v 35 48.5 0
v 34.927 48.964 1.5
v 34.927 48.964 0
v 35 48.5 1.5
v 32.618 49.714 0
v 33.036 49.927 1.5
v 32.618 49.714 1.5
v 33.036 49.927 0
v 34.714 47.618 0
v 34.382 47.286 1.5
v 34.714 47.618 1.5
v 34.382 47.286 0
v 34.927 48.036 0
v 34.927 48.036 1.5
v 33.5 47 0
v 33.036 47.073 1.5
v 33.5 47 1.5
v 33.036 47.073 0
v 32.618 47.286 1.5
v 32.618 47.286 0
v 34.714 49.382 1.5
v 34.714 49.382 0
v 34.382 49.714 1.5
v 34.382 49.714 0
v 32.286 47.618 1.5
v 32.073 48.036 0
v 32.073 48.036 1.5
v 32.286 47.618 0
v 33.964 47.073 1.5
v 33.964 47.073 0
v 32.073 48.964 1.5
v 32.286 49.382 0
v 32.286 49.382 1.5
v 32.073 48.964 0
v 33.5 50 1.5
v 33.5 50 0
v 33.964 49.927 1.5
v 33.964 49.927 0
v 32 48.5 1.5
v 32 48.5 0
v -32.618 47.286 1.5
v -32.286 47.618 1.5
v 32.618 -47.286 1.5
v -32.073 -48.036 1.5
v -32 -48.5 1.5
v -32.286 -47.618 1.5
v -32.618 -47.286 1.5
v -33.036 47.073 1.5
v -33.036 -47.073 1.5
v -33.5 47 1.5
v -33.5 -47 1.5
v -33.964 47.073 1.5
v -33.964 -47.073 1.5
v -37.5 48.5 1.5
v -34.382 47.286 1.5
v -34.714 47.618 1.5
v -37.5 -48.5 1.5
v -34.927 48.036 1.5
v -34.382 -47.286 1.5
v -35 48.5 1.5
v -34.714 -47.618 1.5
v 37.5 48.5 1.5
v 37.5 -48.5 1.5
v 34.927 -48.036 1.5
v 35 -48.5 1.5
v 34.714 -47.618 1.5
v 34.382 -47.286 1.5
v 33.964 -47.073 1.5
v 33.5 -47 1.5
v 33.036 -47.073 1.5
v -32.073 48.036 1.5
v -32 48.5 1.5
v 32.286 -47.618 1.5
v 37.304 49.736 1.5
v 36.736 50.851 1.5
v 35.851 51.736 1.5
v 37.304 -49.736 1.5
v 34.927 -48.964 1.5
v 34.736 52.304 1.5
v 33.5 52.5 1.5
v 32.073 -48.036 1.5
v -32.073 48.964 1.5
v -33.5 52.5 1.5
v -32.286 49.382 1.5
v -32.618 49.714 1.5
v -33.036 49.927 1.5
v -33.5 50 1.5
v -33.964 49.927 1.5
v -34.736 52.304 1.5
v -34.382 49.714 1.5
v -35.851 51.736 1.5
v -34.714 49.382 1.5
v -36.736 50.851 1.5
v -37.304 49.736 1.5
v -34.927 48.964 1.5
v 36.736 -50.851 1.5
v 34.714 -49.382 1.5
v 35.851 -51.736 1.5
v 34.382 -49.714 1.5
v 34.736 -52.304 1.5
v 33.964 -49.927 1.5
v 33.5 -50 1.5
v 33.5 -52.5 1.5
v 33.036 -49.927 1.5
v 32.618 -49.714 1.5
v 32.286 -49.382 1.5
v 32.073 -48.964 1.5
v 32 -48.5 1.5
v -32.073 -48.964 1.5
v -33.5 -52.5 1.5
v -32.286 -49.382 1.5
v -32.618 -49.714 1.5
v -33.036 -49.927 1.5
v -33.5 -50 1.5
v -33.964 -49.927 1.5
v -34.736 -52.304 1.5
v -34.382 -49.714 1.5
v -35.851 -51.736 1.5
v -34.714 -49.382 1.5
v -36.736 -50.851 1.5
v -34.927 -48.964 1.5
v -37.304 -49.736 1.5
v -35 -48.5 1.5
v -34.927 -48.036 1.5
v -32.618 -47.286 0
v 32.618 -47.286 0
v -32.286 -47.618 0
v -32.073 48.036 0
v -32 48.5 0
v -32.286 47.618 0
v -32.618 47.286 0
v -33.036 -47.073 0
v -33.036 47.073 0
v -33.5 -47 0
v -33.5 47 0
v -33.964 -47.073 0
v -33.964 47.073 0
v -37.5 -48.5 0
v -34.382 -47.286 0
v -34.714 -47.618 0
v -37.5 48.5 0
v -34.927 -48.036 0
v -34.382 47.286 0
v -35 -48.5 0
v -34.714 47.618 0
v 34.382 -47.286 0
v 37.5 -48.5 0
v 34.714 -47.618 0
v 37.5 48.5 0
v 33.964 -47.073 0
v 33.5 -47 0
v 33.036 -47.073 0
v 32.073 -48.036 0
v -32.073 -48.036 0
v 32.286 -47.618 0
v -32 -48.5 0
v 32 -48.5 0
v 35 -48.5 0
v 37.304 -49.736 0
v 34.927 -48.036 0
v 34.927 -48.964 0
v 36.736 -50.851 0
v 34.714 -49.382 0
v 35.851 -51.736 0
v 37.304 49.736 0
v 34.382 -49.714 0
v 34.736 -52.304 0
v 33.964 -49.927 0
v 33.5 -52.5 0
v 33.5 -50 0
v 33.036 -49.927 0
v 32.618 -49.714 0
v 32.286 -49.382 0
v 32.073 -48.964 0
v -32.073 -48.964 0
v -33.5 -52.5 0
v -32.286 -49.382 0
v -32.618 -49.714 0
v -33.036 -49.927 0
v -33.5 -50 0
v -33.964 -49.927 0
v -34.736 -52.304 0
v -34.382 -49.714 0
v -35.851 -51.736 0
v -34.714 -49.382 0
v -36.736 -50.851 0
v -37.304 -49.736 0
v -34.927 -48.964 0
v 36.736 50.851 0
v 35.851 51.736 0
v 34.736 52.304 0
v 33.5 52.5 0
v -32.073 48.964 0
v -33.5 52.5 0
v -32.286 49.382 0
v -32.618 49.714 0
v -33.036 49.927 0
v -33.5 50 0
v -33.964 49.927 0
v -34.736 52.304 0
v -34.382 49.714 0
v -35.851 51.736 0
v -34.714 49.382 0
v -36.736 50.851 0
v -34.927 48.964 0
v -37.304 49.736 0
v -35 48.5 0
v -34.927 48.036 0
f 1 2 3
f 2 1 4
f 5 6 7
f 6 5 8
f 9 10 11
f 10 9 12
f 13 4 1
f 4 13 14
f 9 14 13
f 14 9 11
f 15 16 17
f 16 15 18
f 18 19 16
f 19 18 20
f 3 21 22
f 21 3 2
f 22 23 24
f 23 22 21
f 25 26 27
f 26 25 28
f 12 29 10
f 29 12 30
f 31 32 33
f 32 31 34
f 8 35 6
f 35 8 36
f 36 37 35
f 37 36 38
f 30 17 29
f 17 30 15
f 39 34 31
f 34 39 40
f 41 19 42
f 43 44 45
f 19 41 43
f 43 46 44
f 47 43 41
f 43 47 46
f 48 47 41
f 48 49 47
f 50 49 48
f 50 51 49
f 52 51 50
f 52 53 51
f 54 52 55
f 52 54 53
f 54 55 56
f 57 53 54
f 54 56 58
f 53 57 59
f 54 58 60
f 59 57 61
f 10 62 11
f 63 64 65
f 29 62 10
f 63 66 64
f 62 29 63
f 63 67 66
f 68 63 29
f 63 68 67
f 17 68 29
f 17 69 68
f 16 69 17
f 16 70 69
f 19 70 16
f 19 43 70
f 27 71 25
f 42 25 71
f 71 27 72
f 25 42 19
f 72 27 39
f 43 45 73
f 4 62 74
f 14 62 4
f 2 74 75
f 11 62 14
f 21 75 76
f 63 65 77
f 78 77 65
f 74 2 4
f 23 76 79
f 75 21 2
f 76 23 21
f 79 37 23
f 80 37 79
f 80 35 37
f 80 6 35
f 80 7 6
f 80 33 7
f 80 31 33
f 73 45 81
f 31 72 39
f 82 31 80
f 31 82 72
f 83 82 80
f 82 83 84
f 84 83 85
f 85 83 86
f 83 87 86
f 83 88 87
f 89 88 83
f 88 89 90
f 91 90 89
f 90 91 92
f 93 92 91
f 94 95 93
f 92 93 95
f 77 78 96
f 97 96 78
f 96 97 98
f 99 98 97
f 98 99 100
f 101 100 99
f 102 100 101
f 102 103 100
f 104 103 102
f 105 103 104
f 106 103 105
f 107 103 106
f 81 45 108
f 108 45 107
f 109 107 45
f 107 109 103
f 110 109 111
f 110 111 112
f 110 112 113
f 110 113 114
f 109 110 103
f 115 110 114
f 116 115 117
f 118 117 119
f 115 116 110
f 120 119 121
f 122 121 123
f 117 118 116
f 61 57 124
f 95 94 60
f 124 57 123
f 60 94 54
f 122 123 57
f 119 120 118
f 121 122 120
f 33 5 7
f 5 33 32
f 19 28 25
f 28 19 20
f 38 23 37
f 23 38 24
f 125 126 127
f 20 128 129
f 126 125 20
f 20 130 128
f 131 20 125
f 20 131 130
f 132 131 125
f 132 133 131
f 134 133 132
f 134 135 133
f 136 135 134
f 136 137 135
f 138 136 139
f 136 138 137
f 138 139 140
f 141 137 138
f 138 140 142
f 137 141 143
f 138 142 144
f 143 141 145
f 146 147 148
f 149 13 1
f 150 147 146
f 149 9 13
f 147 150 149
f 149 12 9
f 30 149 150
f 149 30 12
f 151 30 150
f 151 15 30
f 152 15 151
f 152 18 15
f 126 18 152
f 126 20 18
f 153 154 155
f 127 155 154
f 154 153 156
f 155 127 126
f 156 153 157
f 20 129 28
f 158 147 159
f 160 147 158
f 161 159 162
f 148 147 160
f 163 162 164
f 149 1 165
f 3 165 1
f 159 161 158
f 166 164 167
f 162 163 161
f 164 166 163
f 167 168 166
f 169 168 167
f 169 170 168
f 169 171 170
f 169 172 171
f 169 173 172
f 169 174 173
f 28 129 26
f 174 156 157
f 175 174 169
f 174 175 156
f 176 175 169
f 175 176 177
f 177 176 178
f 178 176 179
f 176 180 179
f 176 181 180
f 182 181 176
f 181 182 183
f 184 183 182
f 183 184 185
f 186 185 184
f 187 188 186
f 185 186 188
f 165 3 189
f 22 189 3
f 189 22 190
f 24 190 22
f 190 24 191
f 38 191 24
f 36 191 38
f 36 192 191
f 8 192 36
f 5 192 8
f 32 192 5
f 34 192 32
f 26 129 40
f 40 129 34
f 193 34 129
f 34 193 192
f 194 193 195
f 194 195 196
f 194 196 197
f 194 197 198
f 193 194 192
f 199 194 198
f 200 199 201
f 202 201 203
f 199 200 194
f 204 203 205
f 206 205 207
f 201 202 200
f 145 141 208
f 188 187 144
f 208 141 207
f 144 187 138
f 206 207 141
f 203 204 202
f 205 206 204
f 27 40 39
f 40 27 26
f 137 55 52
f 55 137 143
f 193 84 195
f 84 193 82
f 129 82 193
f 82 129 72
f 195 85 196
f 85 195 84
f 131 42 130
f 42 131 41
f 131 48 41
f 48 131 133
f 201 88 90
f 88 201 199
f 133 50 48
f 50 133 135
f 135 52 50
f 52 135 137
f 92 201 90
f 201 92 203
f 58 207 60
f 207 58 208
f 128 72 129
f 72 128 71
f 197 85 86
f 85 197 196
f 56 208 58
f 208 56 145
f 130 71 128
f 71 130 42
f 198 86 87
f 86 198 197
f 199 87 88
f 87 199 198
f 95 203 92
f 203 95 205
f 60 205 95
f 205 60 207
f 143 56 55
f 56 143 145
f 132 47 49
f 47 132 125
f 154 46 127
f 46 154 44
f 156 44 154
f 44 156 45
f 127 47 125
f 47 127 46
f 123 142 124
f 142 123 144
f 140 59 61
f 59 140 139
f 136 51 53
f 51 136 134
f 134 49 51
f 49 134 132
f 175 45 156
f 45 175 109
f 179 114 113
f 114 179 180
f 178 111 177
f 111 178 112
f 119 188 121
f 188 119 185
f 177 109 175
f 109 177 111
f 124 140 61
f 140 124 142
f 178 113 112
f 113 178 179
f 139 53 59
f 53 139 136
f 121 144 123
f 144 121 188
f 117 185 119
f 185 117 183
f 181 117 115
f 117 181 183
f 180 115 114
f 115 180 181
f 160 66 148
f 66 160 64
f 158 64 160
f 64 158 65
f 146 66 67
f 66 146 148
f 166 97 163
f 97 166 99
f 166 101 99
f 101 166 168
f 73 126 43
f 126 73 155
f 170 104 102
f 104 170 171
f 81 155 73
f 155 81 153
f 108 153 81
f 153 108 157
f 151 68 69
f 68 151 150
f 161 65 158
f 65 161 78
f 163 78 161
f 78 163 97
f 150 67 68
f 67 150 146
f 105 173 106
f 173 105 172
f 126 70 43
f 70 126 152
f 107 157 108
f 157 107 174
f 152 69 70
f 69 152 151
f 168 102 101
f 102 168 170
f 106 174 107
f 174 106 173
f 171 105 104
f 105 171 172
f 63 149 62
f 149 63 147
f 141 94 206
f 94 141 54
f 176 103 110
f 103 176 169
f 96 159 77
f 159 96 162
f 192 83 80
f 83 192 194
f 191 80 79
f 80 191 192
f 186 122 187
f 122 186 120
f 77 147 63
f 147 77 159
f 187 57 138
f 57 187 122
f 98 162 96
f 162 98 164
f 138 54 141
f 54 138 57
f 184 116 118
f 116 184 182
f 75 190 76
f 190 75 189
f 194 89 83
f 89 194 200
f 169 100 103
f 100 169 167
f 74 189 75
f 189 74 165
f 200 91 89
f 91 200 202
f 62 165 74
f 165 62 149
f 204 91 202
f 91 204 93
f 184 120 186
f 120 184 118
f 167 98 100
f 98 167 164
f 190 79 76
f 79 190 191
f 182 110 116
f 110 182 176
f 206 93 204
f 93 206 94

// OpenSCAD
// file: flight_controller_vert_screw_holes.scad
module flight_controller_vert_screw_holes(hole_x, hole_y, bore_diameter, height, fn) {
    translate([hole_x/2, hole_y/2, 0])
        cylinder(d=bore_diameter, h=height, $fn=fn);
    
    translate([-hole_x/2, hole_y/2, 0])
        cylinder(d=bore_diameter, h=height, $fn=fn);
    
    translate([-hole_x/2, -hole_y/2, 0])
        cylinder(d=bore_diameter, h=height, $fn=fn);
    
    translate([hole_x/2, -hole_y/2, 0])
        cylinder(d=bore_diameter, h=height, $fn=fn);
}
// file: flight_controller_face_panel_base.scad
use <./flight_controller_vert_screw_holes.scad>;

module flight_controller_face_panel_base(hole_x, hole_y, post_diameter, bore_diameter, case_floor, fn) {
    difference() {
        hull() {
           translate([hole_x/2, hole_y/2, 0])
                cylinder(d=post_diameter, h=case_floor, $fn=fn);
            
            translate([-hole_x/2, hole_y/2, 0])
                cylinder(d=post_diameter, h=case_floor, $fn=fn);
            
            translate([-hole_x/2, -hole_y/2, 0])
                cylinder(d=post_diameter, h=case_floor, $fn=fn);
            
            translate([hole_x/2, -hole_y/2, 0])
                cylinder(d=post_diameter, h=case_floor, $fn=fn);
       }
       flight_controller_vert_screw_holes(hole_x, hole_y, bore_diameter, case_floor, fn);      
   }
}
// file: flight_controller_box_params.scad
function flight_controller_box_params() = [
    ["hole_x", 67],
    ["hole_y", 97],
    ["post_diameter", 8],
    ["bore_diameter", 3],
    ["case_z", 45],
    ["case_floor", 1.5],
    ["case_wall_thickness", 2],
    ["case_wall_height", 20],
    ["fn", 20],
];

// usage: find(params, "hole_x");
function find(h,k)= h[search([k], h, 1)[0]][1];
// main file
use <./flight_controller_box_params.scad>;
use <./flight_controller_face_panel_base.scad>;
use <./flight_controller_vert_screw_holes.scad>;

module flight_controller_top_panel(hole_x, hole_y, post_diameter, bore_diameter, case_z, case_floor, fn) {
    translate([0, 0, case_z])
        difference(){
            flight_controller_face_panel_base(hole_x, hole_y, post_diameter, bore_diameter, case_floor, fn);
            flight_controller_vert_screw_holes(hole_x, hole_y, bore_diameter, case_floor, fn);
        };
}

module flight_controller_top_panel_part() {
    params = flight_controller_box_params();
    hole_x = find(params, "hole_x");
    hole_y = find(params, "hole_y");
    post_diameter = find(params, "post_diameter");
    bore_diameter = find(params, "bore_diameter");
    //case_z = find(params, "case_z");
    case_floor = find(params, "case_floor");
    fn = find(params, "fn");
    flight_controller_top_panel(hole_x, hole_y, post_diameter, bore_diameter, 0, case_floor, fn);
}

flight_controller_top_panel_part();
